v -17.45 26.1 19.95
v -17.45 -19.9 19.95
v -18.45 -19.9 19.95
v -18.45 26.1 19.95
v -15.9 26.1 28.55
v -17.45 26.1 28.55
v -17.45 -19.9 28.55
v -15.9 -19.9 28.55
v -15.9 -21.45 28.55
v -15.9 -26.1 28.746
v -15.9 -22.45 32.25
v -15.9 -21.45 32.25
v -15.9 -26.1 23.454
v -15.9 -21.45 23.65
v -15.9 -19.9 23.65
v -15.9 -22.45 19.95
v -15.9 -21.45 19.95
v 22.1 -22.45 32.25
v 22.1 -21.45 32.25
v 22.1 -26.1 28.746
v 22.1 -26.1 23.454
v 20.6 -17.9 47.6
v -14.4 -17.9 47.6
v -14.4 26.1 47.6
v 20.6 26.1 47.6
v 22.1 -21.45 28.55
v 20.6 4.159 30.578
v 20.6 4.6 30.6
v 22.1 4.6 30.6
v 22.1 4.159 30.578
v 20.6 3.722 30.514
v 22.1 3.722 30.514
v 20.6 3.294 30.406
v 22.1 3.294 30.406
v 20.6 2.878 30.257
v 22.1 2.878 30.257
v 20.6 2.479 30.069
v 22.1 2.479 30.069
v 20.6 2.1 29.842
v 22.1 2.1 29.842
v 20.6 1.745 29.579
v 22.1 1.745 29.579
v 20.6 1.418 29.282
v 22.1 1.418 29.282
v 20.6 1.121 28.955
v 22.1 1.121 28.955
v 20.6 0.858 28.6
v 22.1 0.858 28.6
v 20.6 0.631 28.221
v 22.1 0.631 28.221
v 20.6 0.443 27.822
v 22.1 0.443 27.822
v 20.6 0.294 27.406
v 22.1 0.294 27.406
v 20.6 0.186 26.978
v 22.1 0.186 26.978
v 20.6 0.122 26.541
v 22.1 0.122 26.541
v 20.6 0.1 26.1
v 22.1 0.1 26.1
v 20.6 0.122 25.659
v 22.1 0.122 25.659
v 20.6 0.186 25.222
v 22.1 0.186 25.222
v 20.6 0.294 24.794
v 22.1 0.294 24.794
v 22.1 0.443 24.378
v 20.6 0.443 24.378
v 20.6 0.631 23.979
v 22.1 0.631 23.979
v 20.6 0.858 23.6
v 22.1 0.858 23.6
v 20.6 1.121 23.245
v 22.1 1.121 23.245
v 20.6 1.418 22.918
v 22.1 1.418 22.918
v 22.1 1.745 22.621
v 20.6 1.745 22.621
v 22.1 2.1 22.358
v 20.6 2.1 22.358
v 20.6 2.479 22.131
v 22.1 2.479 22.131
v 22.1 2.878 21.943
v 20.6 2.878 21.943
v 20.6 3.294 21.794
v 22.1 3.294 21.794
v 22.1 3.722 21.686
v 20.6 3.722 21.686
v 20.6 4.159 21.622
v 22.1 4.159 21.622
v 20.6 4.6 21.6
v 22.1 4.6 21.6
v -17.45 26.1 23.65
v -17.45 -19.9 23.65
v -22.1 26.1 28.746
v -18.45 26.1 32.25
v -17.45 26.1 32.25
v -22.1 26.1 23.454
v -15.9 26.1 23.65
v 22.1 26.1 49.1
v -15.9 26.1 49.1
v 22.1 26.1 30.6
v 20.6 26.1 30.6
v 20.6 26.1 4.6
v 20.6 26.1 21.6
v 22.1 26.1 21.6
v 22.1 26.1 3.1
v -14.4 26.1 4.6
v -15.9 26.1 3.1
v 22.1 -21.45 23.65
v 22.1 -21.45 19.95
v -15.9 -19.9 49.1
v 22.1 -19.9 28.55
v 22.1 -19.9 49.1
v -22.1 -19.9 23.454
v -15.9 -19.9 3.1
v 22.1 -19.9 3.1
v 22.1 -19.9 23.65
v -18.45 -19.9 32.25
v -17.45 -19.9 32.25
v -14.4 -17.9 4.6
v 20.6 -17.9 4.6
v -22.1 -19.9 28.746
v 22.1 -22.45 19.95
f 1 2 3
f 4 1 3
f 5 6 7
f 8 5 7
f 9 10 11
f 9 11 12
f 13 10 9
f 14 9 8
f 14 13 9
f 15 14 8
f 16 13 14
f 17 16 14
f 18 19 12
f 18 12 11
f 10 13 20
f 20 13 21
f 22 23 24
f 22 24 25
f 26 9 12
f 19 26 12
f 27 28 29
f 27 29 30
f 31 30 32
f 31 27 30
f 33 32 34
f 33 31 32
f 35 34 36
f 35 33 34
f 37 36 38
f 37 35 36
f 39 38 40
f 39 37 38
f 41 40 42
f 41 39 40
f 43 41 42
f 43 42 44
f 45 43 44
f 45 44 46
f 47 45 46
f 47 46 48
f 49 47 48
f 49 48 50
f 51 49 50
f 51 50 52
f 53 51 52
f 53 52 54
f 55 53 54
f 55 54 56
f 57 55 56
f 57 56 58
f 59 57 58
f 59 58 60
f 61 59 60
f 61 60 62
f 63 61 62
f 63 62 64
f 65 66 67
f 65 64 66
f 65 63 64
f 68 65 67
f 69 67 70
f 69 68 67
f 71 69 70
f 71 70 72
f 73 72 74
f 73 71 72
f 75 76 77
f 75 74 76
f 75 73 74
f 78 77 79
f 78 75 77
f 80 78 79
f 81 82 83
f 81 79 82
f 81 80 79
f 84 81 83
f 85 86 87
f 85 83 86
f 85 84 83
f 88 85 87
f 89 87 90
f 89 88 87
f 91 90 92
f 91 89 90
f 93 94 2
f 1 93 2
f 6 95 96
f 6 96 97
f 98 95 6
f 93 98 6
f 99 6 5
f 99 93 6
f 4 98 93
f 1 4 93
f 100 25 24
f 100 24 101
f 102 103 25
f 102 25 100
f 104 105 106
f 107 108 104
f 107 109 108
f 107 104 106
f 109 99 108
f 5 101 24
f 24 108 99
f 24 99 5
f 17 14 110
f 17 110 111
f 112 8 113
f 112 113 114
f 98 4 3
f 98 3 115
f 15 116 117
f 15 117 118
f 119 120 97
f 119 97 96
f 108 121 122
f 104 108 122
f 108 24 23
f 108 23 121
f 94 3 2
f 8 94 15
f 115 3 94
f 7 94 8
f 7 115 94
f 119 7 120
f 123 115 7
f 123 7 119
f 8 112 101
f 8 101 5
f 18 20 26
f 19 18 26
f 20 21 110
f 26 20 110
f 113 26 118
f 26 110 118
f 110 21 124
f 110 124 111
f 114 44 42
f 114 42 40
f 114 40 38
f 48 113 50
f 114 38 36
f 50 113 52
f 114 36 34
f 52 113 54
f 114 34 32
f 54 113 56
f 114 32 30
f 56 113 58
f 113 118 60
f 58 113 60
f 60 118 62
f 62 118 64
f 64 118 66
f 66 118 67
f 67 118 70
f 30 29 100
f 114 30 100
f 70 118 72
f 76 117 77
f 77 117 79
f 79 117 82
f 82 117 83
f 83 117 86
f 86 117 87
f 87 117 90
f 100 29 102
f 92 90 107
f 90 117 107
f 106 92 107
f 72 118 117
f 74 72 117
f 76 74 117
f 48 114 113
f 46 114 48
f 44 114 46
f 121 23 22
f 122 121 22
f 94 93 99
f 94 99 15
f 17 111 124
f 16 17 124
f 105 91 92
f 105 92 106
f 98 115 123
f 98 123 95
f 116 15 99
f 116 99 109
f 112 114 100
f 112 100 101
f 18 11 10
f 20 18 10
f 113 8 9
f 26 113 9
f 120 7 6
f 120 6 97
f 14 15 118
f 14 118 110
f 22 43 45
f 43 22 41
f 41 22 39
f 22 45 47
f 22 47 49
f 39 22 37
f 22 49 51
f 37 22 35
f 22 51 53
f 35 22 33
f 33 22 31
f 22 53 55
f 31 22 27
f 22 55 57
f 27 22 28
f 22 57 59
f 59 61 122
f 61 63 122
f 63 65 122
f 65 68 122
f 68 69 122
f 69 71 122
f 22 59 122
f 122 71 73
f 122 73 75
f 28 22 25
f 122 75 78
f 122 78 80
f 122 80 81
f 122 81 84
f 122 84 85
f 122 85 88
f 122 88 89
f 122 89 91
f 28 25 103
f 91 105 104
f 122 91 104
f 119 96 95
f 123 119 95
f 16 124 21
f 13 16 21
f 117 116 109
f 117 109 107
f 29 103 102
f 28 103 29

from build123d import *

# Parameters (mm, degrees)
ESQUISSE1_W                   = 44.2
ESQUISSE1_H                   = 52.2
BOSS_EXTRU_1_DEPTH            = 52.2
ENL_V_MAT_EXTRU_2_DEPTH       = 74.209903702
ENL_V_MAT_EXTRU_2_DEPTH_BACK  = 44.2
ENL_V_MAT_EXTRU_3_DEPTH       = 74.209903702
ENL_V_MAT_EXTRU_3_DEPTH_BACK  = 44.2
ENL_V_MAT_EXTRU_4_DEPTH       = 78.059003368
ENL_V_MAT_EXTRU_4_DEPTH_BACK  = 46
ENL_V_MAT_EXTRU_5_DEPTH       = 78.059003368
ENL_V_MAT_EXTRU_5_DEPTH_BACK  = 46
ENL_V_MAT_EXTRU_7_DEPTH       = 45.550224466
ENL_V_MAT_EXTRU_7_DEPTH_BACK  = 45.550224466
ENL_V_MAT_EXTRU_8_DEPTH       = 78.059003368
ENL_V_MAT_EXTRU_8_DEPTH_BACK  = 46
ENL_V_MAT_EXTRU_9_DEPTH       = 75.993733072
ENL_V_MAT_EXTRU_9_DEPTH_BACK  = 46
ESQUISSE13_W                  = 35
ESQUISSE13_H                  = 43
ENL_V_MAT_EXTRU_10_DEPTH      = 44
ENL_V_MAT_EXTRU_11_DEPTH      = 72.032809321
ENL_V_MAT_EXTRU_11_DEPTH_BACK = 1.5


with BuildPart() as part:
    # Esquisse1 → Boss.-Extru.1 (new body)
    with BuildSketch(Plane.XY):
        Rectangle(ESQUISSE1_W, ESQUISSE1_H)
    extrude(amount=BOSS_EXTRU_1_DEPTH)

    # Esquisse2 → Enlèv. mat.-Extru.2 (cut, two sides: drawn at the far end of the back side and taken through both)
    with BuildSketch(Plane(origin=(22.1, 0, 0), x_dir=(0, 0, -1), z_dir=(1, 0, 0)).offset(-ENL_V_MAT_EXTRU_2_DEPTH_BACK)):
        Polygon((-201.352290675, -19.9), (-52.2, -19.9), (-28.55, -19.9), (-28.55, -21.45), (-32.25, -21.45), (-32.25, -22.45), (-28.745559959, -26.1), (74.553898465, -133.690091099), (-39.180744024, -409.461834307), (-315.086933163, -295.671743208), align=None)
    extrude(amount=ENL_V_MAT_EXTRU_2_DEPTH + ENL_V_MAT_EXTRU_2_DEPTH_BACK, mode=Mode.SUBTRACT)

    # Esquisse3 → Enlèv. mat.-Extru.3 (cut, two sides: drawn at the far end of the back side and taken through both)
    with BuildSketch(Plane(origin=(22.1, 0, 0), x_dir=(0, 0, -1), z_dir=(1, 0, 0)).offset(-ENL_V_MAT_EXTRU_3_DEPTH_BACK)):
        Polygon((149.152290675, -19.9), (0, -19.9), (-23.65, -19.9), (-23.65, -21.45), (-19.95, -21.45), (-19.95, -22.45), (-23.454440041, -26.1), (-126.753898465, -133.690091099), (-13.019255976, -409.461834307), (262.886933163, -295.671743208), align=None)
    extrude(amount=ENL_V_MAT_EXTRU_3_DEPTH + ENL_V_MAT_EXTRU_3_DEPTH_BACK, mode=Mode.SUBTRACT)

    # Esquisse4 → Enlèv. mat.-Extru.4 (cut, two sides: drawn at the far end of the back side and taken through both)
    with BuildSketch(Plane(origin=(0, 26.1, 0), x_dir=(1, 0, 0), z_dir=(0, 1, 0)).offset(-ENL_V_MAT_EXTRU_4_DEPTH_BACK)):
        Polygon((-15.9, -191.333109619), (-15.9, -52.2), (-15.9, -28.55), (-17.45, -28.55), (-17.45, -32.25), (-18.45, -32.25), (-22.1, -28.745559959), (-122.462816227, 67.614843274), (-379.791464965, -38.281593439), (-273.228648738, -297.229546332), align=None)
    extrude(amount=ENL_V_MAT_EXTRU_4_DEPTH + ENL_V_MAT_EXTRU_4_DEPTH_BACK, mode=Mode.SUBTRACT)

    # Esquisse5 → Enlèv. mat.-Extru.5 (cut, two sides: drawn at the far end of the back side and taken through both)
    with BuildSketch(Plane(origin=(0, 26.1, 0), x_dir=(1, 0, 0), z_dir=(0, 1, 0)).offset(-ENL_V_MAT_EXTRU_5_DEPTH_BACK)):
        Polygon((-15.9, 139.133109619), (-15.9, 0), (-15.9, -23.65), (-17.45, -23.65), (-17.45, -19.95), (-18.45, -19.95), (-22.1, -23.454440041), (-122.462816228, -119.814843274), (-379.791464965, -13.918406561), (-273.228648738, 245.029546332), align=None)
    extrude(amount=ENL_V_MAT_EXTRU_5_DEPTH + ENL_V_MAT_EXTRU_5_DEPTH_BACK, mode=Mode.SUBTRACT)

    # Esquisse6 → Enlèv. mat.-Extru.7 (cut, two sides: drawn at the far end of the back side and taken through both)
    with BuildSketch(Plane.XY.offset(28.55).offset(-ENL_V_MAT_EXTRU_7_DEPTH_BACK)):
        Polygon((-161.22284167, -19.9), (-22.1, -19.9), (-15.9, -19.9), (-15.9, -26.093649616), (-15.9, -165.216491285), (-212.645110561, -361.97019968), (-357.967952231, -216.653708395), align=None)
    extrude(amount=ENL_V_MAT_EXTRU_7_DEPTH + ENL_V_MAT_EXTRU_7_DEPTH_BACK, mode=Mode.SUBTRACT)

    # Esquisse11 → Enlèv. mat.-Extru.8 (cut, two sides: drawn at the far end of the back side and taken through both)
    with BuildSketch(Plane(origin=(0, 26.1, 0), x_dir=(1, 0, 0), z_dir=(0, 1, 0)).offset(-ENL_V_MAT_EXTRU_8_DEPTH_BACK)):
        Polygon((164.227968273, -49.1), (22.1, -49.1), (-15.9, -49.1), (-158.027968273, -49.1), (-158.027968273, -333.355936546), (164.227968273, -333.355936546), align=None)
    extrude(amount=ENL_V_MAT_EXTRU_8_DEPTH + ENL_V_MAT_EXTRU_8_DEPTH_BACK, mode=Mode.SUBTRACT)

    # Esquisse12 → Enlèv. mat.-Extru.9 (cut, two sides: drawn at the far end of the back side and taken through both)
    with BuildSketch(Plane(origin=(0, 26.1, 0), x_dir=(1, 0, 0), z_dir=(0, 1, 0)).offset(-ENL_V_MAT_EXTRU_9_DEPTH_BACK)):
        Polygon((159.687460199, -3.1), (22.1, -3.1), (-15.9, -3.1), (-153.487460199, -3.1), (-153.487460199, 272.074920398), (159.687460199, 272.074920398), align=None)
    extrude(amount=ENL_V_MAT_EXTRU_9_DEPTH + ENL_V_MAT_EXTRU_9_DEPTH_BACK, mode=Mode.SUBTRACT)

    # Esquisse13 → Enlèv. mat.-Extru.10 (cut)
    with BuildSketch(Plane(origin=(0, 26.1, 0), x_dir=(1, 0, 0), z_dir=(0, 1, 0))):
        with Locations((3.1, -26.1)):
            Rectangle(ESQUISSE13_W, ESQUISSE13_H)
    extrude(amount=-ENL_V_MAT_EXTRU_10_DEPTH, mode=Mode.SUBTRACT)

    # Esquisse14 → Enlèv. mat.-Extru.11 (cut, two sides: drawn at the far end of the back side and taken through both)
    with BuildSketch(Plane(origin=(22.1, 0, 0), x_dir=(0, 0, -1), z_dir=(1, 0, 0)).offset(-ENL_V_MAT_EXTRU_11_DEPTH_BACK)):
        with BuildLine():
            Line((-21.6, 4.6), (-21.6, 26.1))
            Line((-21.6, 26.1), (-30.6, 26.1))
            Line((-30.6, 26.1), (-30.6, 4.6))
            ThreePointArc((-30.6, 4.6), (-26.1, 0.1), (-21.6, 4.6))
        make_face()
    extrude(amount=ENL_V_MAT_EXTRU_11_DEPTH + ENL_V_MAT_EXTRU_11_DEPTH_BACK, mode=Mode.SUBTRACT)


solid = part.part
